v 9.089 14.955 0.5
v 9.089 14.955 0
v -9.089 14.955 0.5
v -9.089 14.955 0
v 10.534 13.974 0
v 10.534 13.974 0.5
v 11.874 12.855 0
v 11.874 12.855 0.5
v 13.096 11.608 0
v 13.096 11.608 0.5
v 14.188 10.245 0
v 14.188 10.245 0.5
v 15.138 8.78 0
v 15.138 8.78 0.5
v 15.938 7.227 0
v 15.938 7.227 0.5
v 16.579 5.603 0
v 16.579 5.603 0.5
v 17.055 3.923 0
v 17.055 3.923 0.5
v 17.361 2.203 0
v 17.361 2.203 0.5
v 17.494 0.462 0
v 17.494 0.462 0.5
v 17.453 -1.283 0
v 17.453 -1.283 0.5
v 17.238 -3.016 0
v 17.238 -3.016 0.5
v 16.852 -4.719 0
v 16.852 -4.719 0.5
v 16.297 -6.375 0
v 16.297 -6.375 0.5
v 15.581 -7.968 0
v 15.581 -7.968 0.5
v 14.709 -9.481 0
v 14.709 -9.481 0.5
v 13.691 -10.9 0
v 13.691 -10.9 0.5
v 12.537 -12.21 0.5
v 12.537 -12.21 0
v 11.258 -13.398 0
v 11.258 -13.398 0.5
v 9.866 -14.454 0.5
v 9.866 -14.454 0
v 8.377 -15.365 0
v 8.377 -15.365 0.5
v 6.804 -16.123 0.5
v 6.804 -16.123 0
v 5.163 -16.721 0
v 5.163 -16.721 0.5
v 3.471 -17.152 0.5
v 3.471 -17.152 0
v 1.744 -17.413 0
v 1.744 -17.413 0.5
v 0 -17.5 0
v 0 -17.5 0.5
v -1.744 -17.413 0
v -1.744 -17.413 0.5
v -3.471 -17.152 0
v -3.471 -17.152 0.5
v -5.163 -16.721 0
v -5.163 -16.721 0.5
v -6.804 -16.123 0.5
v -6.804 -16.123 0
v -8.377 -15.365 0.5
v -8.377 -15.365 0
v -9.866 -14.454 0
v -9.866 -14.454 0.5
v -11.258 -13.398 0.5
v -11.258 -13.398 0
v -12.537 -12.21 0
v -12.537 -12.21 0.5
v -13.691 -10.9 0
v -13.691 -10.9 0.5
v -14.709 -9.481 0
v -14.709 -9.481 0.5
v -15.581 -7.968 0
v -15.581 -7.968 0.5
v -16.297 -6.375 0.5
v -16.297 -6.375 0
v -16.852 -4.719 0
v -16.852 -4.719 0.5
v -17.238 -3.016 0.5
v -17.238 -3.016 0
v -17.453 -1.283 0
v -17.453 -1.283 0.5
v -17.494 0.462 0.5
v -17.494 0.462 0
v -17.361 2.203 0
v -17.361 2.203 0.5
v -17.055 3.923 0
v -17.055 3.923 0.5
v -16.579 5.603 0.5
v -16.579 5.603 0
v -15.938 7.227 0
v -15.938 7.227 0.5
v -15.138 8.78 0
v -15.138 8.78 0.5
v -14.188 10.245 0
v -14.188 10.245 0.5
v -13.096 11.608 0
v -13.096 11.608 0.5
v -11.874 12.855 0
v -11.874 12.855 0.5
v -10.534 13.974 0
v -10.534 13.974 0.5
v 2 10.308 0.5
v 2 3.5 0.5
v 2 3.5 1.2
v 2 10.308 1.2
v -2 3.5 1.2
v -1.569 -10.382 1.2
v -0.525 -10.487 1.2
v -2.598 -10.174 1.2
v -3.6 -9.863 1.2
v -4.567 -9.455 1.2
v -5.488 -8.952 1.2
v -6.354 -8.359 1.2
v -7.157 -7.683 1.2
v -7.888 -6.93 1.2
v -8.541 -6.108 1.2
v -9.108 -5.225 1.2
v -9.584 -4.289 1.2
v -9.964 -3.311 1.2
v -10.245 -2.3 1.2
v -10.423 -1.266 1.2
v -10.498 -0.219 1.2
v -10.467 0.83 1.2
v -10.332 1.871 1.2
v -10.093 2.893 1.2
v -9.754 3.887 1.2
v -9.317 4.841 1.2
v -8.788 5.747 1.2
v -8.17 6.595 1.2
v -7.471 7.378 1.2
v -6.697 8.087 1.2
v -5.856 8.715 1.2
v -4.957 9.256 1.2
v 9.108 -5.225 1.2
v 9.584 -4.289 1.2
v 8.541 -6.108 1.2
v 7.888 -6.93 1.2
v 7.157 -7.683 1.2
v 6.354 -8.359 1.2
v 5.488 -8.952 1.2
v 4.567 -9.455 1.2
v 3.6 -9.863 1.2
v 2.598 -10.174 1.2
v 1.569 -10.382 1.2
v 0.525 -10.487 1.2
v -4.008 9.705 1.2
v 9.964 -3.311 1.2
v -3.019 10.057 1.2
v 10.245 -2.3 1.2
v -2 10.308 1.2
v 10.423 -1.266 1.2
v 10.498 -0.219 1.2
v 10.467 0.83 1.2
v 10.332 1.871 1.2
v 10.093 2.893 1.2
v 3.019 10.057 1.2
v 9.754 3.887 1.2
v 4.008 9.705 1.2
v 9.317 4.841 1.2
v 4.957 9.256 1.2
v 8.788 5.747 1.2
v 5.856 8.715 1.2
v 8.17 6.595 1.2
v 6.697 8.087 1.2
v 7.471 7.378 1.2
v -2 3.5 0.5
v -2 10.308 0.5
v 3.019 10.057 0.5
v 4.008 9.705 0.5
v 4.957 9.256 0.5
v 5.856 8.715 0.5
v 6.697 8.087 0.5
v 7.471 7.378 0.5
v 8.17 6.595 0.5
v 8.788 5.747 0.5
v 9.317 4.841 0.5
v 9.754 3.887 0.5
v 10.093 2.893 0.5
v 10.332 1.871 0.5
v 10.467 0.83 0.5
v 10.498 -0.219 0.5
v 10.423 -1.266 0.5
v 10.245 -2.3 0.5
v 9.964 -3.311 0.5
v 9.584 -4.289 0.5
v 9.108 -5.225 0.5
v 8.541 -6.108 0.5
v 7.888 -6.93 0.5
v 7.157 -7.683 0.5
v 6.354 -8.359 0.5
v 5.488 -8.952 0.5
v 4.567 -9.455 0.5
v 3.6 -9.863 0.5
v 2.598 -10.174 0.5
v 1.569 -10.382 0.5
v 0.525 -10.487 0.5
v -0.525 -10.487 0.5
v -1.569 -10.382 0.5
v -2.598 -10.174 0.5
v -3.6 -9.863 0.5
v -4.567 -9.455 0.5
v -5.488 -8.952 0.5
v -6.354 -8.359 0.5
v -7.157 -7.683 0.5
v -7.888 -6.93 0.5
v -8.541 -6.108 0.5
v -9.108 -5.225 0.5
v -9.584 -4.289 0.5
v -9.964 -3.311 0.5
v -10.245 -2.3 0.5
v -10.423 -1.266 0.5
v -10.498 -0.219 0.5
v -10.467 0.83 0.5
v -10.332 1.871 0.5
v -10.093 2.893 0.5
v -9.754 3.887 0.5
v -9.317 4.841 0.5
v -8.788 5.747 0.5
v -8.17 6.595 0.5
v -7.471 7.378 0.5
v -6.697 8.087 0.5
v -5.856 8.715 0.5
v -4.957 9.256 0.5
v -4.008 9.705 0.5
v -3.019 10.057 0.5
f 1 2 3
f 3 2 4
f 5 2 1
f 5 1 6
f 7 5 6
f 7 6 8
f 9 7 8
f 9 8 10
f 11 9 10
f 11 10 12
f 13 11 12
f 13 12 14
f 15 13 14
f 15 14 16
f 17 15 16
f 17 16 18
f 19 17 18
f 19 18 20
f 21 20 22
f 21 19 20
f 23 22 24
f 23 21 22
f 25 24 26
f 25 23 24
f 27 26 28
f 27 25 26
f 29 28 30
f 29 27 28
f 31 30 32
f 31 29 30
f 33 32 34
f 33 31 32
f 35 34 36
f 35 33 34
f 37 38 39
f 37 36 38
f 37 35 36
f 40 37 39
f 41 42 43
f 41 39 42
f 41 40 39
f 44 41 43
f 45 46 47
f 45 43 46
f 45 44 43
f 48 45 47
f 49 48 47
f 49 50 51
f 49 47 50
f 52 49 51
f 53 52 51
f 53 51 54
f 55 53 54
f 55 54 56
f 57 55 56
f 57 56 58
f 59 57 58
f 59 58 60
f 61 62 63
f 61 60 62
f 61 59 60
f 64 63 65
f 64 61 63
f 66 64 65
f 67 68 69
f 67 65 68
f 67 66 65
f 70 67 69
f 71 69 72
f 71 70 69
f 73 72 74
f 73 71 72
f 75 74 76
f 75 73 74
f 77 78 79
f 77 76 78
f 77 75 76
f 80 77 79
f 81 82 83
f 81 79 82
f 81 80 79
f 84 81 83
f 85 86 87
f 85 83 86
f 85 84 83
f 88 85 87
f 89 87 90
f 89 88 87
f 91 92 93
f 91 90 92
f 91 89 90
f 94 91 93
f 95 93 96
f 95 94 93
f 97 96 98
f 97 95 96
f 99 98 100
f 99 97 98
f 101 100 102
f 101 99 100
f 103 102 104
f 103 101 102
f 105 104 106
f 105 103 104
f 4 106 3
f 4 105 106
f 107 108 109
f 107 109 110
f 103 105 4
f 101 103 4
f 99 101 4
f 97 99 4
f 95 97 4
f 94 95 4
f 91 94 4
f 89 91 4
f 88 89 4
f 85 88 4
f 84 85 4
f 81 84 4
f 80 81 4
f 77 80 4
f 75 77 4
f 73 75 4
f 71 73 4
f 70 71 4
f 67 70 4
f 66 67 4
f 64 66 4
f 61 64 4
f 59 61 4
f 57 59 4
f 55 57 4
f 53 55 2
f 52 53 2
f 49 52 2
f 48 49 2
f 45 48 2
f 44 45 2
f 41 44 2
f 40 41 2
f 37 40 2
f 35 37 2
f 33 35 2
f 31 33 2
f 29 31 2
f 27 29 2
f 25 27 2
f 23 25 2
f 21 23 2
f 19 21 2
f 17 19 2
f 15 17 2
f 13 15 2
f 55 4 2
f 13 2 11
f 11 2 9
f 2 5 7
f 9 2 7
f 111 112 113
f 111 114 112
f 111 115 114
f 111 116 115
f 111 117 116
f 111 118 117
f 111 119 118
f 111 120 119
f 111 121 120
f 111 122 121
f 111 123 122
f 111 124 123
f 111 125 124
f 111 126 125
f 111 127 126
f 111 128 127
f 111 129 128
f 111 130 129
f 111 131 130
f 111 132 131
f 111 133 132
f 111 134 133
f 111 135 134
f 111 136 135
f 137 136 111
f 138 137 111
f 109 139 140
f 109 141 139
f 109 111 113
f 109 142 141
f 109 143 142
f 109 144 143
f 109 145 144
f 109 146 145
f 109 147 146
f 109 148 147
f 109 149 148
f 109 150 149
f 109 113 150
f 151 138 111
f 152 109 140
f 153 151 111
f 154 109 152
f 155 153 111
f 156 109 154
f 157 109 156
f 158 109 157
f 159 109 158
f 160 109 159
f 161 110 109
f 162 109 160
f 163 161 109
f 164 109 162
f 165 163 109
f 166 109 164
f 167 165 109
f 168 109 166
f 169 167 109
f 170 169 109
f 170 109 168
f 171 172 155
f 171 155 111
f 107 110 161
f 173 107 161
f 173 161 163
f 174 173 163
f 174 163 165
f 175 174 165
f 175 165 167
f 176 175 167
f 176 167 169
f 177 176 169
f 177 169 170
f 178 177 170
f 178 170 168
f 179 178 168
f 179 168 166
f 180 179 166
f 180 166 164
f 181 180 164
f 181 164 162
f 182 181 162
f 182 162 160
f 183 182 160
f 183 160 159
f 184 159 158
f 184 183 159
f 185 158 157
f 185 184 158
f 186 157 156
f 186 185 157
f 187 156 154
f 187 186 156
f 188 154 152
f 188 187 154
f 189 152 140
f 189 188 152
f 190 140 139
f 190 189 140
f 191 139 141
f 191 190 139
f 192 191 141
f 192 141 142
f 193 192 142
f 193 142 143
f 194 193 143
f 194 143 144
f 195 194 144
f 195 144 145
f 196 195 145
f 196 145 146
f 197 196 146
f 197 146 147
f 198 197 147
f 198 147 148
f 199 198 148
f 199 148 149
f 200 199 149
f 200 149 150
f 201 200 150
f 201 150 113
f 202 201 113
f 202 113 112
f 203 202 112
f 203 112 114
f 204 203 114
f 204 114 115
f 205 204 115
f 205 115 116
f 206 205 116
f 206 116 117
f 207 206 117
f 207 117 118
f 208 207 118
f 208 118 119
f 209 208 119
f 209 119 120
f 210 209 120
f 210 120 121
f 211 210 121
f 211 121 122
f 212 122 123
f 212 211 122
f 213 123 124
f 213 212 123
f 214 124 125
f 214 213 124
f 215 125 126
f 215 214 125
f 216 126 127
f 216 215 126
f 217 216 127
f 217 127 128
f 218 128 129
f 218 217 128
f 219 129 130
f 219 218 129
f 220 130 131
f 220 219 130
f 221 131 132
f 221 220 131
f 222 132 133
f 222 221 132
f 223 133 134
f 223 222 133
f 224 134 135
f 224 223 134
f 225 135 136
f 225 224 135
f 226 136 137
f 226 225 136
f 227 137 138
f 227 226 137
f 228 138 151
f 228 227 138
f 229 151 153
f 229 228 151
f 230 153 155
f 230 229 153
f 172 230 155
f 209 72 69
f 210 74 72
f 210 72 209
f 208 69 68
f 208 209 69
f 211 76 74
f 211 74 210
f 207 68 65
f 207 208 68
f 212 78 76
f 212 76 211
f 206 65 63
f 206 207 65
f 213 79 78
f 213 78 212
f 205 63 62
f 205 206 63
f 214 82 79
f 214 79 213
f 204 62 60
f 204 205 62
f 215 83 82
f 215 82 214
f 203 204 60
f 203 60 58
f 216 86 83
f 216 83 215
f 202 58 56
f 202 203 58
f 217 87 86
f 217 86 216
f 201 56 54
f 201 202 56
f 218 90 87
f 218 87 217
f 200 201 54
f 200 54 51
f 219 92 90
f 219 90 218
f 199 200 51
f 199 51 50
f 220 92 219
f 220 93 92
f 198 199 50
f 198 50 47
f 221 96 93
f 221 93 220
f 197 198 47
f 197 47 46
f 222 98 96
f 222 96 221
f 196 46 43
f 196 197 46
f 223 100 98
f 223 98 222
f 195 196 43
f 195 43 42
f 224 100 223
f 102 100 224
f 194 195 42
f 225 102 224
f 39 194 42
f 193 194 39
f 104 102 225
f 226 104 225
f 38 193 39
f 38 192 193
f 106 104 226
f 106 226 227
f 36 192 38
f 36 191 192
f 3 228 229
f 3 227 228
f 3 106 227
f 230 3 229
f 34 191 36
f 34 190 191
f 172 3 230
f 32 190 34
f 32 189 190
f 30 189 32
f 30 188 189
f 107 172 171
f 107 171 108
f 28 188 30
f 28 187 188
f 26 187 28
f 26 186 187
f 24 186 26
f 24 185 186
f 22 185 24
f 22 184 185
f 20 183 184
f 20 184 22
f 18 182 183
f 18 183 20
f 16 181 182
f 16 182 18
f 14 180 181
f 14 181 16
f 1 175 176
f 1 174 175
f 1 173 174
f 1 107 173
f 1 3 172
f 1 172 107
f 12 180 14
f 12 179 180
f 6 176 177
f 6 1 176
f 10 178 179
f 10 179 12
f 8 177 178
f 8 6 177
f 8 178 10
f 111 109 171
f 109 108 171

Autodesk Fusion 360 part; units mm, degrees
sketch "Szkic1" plane through (0, 0, 0) normal (0, 0, 1) x (1, 0, 0)
  circle A0 centre (0, 0) radius 10.5
  line L0 (0, 10.5) -> (0, 3.5) construction
  line L1 (0, 3.5) -> (2, 3.5)
  line L2 (2, 3.5) -> (2, 11)
  line L3 (2, 11) -> (-2, 11)
  line L4 (-2, 11) -> (-2, 3.5)
  line L5 (-2, 3.5) -> (0, 3.5)
  circle A1 centre (0, 0) radius 17.5
  line L6 (9.089, 14.9546) -> (-9.089, 14.9546)
  dimension "d1" = 21
  dimension "d2" = 7
  dimension "d3" = 2
  dimension "d4" = 3.5
  dimension "d5" = 2
  dimension "d6" = 3.5
  dimension "d7" = 0.5
  dimension "d10" = 35
  dimension "d15" = 18.1779
extrude "Wyciągnięcie proste1" add sketch "Szkic1" along normal blind 1 contours A0 L1 L2 L4 L5 picked at (1.5608, -1.0505)
extrude "Wyciągnięcie proste2" add sketch "Szkic1" along normal blind 0.5 contours A0 L1 L2 L4 L5 | A0 L2 L3 L4 | A1 L6 picked at (-1.3333, 5.7693) picked at (0.6667, 13.6364)
extrude "Wyciągnięcie proste3" add 1 faces at (0, -1.1667, 1) along direction (0, 0, 1) blind 0.2
